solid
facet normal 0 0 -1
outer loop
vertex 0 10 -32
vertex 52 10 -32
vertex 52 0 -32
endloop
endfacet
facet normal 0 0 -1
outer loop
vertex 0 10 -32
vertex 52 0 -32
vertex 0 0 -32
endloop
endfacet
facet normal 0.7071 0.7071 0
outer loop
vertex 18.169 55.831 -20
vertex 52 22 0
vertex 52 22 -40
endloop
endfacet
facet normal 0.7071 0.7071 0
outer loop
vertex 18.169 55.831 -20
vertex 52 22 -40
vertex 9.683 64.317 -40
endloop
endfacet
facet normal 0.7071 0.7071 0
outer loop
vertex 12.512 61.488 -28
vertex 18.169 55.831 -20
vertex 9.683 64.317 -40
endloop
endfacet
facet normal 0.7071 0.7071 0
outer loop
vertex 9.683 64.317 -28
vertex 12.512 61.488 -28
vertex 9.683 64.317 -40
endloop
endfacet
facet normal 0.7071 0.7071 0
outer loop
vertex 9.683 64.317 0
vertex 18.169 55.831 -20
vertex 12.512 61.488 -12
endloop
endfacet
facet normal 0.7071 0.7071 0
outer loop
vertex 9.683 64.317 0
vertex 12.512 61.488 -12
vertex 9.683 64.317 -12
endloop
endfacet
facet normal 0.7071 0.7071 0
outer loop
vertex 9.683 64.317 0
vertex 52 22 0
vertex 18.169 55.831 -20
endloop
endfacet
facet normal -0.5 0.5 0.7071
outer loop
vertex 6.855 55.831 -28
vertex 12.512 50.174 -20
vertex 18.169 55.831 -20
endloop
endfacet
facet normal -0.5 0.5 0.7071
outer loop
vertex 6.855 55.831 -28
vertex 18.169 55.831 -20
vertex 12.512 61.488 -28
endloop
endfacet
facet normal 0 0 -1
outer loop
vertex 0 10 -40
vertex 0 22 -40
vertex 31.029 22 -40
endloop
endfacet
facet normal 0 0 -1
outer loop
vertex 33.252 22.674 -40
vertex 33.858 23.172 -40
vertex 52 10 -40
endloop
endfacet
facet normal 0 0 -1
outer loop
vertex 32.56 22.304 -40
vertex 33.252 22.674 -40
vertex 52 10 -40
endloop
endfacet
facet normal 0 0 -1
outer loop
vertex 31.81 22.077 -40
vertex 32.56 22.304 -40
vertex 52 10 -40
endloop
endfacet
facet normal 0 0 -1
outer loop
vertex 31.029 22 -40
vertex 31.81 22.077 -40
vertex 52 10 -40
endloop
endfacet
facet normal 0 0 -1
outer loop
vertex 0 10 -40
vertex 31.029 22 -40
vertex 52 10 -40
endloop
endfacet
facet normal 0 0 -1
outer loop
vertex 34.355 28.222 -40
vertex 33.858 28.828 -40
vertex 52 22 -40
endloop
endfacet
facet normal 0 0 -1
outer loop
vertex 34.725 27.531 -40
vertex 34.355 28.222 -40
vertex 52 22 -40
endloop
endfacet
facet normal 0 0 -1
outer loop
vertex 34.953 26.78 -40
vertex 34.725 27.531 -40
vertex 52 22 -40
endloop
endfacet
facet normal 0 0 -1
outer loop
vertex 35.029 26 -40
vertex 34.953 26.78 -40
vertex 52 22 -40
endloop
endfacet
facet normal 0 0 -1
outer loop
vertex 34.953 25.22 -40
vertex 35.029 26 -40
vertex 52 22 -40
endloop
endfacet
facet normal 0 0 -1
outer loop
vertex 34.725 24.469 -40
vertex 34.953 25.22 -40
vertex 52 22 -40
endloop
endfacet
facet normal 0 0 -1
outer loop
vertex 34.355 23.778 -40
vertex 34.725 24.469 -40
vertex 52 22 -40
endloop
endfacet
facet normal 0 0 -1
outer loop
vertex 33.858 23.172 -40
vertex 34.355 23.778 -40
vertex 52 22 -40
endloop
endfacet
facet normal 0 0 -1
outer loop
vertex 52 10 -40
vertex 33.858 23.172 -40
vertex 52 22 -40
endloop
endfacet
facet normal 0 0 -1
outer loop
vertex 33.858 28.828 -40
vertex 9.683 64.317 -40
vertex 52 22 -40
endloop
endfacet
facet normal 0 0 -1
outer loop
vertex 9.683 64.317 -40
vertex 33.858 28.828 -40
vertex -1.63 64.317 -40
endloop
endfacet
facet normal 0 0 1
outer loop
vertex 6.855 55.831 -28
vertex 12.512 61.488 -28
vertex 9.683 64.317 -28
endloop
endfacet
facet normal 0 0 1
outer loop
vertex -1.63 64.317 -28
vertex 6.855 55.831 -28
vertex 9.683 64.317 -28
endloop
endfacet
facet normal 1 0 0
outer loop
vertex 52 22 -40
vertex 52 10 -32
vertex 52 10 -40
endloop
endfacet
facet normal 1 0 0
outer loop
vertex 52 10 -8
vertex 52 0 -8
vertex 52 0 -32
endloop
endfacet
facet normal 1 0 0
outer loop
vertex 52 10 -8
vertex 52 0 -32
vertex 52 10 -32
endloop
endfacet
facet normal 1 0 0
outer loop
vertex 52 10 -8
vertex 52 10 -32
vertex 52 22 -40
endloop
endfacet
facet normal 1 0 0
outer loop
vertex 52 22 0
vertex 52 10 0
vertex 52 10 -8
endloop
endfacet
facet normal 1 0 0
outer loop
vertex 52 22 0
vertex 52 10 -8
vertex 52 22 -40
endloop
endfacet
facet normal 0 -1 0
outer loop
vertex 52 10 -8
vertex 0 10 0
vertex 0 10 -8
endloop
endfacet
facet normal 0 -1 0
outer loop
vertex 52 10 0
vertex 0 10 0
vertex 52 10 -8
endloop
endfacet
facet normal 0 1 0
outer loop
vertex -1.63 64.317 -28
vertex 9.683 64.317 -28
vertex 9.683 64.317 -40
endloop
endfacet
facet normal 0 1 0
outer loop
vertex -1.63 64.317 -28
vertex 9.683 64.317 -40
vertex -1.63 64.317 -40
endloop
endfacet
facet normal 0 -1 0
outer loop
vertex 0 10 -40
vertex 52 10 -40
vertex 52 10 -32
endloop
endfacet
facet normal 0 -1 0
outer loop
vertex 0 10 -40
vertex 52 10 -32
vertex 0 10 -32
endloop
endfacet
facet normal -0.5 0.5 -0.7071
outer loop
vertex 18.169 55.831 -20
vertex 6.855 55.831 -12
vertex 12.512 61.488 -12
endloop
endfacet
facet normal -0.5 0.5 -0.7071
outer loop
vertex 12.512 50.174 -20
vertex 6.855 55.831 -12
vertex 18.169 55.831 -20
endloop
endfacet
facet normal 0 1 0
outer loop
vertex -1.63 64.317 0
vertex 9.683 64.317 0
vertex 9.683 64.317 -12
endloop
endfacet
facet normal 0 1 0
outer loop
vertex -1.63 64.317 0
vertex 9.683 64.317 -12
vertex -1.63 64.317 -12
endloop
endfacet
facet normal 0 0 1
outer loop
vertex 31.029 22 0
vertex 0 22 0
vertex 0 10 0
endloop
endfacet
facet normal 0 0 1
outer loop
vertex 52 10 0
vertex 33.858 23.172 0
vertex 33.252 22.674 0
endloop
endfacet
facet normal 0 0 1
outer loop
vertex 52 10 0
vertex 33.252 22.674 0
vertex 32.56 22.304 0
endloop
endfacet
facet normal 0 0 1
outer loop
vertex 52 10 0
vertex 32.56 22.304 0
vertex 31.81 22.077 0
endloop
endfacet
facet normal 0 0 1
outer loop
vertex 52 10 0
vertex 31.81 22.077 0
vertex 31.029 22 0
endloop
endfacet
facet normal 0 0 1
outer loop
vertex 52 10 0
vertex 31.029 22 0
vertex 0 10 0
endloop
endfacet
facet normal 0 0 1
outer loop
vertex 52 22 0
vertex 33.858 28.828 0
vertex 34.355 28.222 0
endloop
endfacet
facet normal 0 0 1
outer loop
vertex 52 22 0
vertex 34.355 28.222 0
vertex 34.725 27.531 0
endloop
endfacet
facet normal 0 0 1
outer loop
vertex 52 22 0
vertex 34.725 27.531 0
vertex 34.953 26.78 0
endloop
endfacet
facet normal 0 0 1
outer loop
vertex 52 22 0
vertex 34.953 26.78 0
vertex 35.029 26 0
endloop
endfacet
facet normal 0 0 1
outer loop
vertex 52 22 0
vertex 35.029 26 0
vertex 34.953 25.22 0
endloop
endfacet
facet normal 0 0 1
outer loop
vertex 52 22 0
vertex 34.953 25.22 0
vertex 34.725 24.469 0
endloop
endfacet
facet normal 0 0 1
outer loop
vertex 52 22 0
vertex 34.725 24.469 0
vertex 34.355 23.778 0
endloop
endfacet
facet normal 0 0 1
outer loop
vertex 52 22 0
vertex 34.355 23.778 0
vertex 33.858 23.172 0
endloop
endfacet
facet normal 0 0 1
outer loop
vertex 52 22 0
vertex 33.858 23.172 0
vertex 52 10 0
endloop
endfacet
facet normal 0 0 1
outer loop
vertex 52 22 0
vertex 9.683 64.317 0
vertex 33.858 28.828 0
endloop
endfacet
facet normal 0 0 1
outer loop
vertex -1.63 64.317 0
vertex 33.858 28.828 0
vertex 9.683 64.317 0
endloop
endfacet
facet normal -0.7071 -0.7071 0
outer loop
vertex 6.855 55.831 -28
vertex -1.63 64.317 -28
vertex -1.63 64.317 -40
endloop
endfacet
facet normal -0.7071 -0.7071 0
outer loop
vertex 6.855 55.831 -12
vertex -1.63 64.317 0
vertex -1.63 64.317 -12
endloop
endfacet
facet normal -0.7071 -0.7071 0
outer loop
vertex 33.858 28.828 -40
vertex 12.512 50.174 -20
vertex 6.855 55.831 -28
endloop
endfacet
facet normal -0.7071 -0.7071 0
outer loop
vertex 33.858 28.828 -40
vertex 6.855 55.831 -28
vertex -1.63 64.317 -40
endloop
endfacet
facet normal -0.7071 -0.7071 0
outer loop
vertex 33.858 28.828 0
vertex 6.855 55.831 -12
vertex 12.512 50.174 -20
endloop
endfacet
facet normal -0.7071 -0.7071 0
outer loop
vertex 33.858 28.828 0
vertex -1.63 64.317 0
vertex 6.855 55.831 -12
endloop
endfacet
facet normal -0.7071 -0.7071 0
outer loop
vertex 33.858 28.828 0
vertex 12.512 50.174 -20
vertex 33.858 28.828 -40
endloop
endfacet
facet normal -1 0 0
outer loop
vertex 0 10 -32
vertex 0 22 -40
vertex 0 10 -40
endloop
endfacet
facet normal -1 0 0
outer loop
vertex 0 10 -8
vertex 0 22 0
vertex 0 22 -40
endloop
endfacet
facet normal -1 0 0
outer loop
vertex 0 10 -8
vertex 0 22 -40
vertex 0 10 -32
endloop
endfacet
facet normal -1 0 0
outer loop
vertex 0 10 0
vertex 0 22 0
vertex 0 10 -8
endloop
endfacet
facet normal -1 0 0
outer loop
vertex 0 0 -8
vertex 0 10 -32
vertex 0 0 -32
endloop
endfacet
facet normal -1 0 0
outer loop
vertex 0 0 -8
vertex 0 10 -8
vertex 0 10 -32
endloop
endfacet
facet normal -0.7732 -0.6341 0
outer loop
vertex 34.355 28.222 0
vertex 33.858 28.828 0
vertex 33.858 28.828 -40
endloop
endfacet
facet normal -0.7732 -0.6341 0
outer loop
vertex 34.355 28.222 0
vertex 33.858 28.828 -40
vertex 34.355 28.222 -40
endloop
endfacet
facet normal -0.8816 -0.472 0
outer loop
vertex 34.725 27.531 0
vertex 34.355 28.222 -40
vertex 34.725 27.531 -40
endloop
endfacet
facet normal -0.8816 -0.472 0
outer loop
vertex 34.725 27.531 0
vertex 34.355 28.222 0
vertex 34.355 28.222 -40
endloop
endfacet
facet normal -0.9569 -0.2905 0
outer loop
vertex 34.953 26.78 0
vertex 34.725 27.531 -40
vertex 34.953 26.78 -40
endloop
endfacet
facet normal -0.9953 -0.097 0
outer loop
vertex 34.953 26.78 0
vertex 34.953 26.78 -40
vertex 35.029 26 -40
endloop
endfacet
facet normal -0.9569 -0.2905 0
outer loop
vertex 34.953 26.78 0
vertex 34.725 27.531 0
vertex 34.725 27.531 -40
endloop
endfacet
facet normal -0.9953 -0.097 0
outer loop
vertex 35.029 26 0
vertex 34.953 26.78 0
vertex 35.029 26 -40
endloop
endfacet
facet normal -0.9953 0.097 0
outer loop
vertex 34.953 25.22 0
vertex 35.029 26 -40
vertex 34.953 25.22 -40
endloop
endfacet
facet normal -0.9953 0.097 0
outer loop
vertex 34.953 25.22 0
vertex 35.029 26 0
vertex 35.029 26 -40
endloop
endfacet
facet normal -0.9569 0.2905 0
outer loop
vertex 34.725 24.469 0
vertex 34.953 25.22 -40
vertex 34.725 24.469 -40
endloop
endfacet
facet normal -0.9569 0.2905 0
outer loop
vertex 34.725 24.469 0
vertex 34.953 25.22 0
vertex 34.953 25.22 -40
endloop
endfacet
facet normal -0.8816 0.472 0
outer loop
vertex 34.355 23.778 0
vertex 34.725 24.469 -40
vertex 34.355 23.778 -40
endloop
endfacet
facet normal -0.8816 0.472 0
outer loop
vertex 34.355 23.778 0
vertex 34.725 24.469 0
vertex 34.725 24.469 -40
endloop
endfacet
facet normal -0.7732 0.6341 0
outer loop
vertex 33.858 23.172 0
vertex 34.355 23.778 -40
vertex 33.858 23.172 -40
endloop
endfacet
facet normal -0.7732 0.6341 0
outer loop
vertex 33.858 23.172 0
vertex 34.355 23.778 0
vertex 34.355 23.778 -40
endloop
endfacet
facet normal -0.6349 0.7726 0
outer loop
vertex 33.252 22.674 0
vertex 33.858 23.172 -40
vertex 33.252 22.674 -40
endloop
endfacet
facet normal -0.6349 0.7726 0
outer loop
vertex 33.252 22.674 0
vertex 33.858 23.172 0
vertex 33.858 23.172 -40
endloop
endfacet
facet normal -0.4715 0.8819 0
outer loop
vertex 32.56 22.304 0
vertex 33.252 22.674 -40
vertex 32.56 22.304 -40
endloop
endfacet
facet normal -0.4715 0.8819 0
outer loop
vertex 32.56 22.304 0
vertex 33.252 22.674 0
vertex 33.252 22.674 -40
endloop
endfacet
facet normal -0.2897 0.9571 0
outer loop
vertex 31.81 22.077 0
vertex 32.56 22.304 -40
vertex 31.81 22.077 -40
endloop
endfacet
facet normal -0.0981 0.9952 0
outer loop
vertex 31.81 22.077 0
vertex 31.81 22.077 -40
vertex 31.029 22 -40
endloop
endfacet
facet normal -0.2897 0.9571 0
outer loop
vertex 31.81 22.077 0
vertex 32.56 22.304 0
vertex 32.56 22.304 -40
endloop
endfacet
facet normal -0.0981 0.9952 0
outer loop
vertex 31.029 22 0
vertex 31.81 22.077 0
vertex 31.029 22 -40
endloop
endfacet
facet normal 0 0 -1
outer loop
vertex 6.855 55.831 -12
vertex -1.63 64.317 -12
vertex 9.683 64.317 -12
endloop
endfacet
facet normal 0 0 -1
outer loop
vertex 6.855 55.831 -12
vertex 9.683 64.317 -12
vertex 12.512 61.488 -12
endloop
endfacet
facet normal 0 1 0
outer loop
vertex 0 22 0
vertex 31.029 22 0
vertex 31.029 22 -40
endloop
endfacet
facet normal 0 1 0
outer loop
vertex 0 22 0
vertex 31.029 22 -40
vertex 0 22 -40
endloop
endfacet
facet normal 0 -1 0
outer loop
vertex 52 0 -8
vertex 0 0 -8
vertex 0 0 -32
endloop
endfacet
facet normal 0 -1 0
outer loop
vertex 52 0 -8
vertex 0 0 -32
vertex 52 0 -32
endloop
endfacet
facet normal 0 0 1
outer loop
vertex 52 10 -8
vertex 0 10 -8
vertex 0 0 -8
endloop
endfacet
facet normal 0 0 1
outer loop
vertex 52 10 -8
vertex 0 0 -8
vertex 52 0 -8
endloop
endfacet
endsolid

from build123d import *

# Parameters (mm, degrees)
EXTRUDE_1_DEPTH          = 40
SKETCH_4_W               = 52
SKETCH_4_H               = 10
CUT_EXTRUDE_1_DEPTH      = 8
SKETCH_7_W               = 52
SKETCH_7_H               = 10
CUT_EXTRUDE_2_DEPTH      = 8
CUT_EXTRUDE_3_DEPTH      = 67.792933004
CUT_EXTRUDE_3_DEPTH_BACK = 67.792933004


with BuildPart() as part:
    # 草圖2 → 填料-伸長1 (new body)
    with BuildSketch(Plane.XY):
        with BuildLine():
            Line((0, 0), (52, 0))
            Line((52, 0), (52, 22))
            Line((52, 22), (9.683462586, 64.316537414))
            Line((9.683462586, 64.316537414), (-1.630245913, 64.316537414))
            Line((-1.630245913, 64.316537414), (33.857864376, 28.828427125))
            ThreePointArc((33.857864376, 28.828427125), (34.724955382, 24.469266271), (31.029437252, 22))
            Line((31.029437252, 22), (0, 22))
            Line((0, 22), (0, 0))
        make_face()
    extrude(amount=-EXTRUDE_1_DEPTH)

    # 草圖4 → 除料-伸長1 (cut)
    with BuildSketch(Plane.XY):
        with Locations((26, 5)):
            Rectangle(SKETCH_4_W, SKETCH_4_H)
    extrude(amount=-CUT_EXTRUDE_1_DEPTH, mode=Mode.SUBTRACT)

    # 草圖7 → 除料-伸長2 (cut)
    with BuildSketch(Plane(origin=(0, 0, -40), x_dir=(-1, 0, 0), z_dir=(0, 0, -1))):
        with Locations((-26, 5)):
            Rectangle(SKETCH_7_W, SKETCH_7_H)
    extrude(amount=-CUT_EXTRUDE_2_DEPTH, mode=Mode.SUBTRACT)

    # 草圖9 → 除料-伸長3 (cut, two sides: drawn at the far end of the back side and taken through both)
    with BuildSketch(Plane(origin=(37, 37, 0), x_dir=(0, 0, -1), z_dir=(0.7071067811865432, 0.7071067811865519, 0)).offset(-CUT_EXTRUDE_3_DEPTH_BACK)):
        Polygon((12, 232.582795613), (12, 46.631417687), (12, 34.631417687), (20, 26.631417687), (28, 34.631417687), (28, 46.631417687), (28, 232.582795613), (28, 604.485551465), (12, 604.485551465), align=None)
    extrude(amount=CUT_EXTRUDE_3_DEPTH + CUT_EXTRUDE_3_DEPTH_BACK, mode=Mode.SUBTRACT)


solid = part.part
